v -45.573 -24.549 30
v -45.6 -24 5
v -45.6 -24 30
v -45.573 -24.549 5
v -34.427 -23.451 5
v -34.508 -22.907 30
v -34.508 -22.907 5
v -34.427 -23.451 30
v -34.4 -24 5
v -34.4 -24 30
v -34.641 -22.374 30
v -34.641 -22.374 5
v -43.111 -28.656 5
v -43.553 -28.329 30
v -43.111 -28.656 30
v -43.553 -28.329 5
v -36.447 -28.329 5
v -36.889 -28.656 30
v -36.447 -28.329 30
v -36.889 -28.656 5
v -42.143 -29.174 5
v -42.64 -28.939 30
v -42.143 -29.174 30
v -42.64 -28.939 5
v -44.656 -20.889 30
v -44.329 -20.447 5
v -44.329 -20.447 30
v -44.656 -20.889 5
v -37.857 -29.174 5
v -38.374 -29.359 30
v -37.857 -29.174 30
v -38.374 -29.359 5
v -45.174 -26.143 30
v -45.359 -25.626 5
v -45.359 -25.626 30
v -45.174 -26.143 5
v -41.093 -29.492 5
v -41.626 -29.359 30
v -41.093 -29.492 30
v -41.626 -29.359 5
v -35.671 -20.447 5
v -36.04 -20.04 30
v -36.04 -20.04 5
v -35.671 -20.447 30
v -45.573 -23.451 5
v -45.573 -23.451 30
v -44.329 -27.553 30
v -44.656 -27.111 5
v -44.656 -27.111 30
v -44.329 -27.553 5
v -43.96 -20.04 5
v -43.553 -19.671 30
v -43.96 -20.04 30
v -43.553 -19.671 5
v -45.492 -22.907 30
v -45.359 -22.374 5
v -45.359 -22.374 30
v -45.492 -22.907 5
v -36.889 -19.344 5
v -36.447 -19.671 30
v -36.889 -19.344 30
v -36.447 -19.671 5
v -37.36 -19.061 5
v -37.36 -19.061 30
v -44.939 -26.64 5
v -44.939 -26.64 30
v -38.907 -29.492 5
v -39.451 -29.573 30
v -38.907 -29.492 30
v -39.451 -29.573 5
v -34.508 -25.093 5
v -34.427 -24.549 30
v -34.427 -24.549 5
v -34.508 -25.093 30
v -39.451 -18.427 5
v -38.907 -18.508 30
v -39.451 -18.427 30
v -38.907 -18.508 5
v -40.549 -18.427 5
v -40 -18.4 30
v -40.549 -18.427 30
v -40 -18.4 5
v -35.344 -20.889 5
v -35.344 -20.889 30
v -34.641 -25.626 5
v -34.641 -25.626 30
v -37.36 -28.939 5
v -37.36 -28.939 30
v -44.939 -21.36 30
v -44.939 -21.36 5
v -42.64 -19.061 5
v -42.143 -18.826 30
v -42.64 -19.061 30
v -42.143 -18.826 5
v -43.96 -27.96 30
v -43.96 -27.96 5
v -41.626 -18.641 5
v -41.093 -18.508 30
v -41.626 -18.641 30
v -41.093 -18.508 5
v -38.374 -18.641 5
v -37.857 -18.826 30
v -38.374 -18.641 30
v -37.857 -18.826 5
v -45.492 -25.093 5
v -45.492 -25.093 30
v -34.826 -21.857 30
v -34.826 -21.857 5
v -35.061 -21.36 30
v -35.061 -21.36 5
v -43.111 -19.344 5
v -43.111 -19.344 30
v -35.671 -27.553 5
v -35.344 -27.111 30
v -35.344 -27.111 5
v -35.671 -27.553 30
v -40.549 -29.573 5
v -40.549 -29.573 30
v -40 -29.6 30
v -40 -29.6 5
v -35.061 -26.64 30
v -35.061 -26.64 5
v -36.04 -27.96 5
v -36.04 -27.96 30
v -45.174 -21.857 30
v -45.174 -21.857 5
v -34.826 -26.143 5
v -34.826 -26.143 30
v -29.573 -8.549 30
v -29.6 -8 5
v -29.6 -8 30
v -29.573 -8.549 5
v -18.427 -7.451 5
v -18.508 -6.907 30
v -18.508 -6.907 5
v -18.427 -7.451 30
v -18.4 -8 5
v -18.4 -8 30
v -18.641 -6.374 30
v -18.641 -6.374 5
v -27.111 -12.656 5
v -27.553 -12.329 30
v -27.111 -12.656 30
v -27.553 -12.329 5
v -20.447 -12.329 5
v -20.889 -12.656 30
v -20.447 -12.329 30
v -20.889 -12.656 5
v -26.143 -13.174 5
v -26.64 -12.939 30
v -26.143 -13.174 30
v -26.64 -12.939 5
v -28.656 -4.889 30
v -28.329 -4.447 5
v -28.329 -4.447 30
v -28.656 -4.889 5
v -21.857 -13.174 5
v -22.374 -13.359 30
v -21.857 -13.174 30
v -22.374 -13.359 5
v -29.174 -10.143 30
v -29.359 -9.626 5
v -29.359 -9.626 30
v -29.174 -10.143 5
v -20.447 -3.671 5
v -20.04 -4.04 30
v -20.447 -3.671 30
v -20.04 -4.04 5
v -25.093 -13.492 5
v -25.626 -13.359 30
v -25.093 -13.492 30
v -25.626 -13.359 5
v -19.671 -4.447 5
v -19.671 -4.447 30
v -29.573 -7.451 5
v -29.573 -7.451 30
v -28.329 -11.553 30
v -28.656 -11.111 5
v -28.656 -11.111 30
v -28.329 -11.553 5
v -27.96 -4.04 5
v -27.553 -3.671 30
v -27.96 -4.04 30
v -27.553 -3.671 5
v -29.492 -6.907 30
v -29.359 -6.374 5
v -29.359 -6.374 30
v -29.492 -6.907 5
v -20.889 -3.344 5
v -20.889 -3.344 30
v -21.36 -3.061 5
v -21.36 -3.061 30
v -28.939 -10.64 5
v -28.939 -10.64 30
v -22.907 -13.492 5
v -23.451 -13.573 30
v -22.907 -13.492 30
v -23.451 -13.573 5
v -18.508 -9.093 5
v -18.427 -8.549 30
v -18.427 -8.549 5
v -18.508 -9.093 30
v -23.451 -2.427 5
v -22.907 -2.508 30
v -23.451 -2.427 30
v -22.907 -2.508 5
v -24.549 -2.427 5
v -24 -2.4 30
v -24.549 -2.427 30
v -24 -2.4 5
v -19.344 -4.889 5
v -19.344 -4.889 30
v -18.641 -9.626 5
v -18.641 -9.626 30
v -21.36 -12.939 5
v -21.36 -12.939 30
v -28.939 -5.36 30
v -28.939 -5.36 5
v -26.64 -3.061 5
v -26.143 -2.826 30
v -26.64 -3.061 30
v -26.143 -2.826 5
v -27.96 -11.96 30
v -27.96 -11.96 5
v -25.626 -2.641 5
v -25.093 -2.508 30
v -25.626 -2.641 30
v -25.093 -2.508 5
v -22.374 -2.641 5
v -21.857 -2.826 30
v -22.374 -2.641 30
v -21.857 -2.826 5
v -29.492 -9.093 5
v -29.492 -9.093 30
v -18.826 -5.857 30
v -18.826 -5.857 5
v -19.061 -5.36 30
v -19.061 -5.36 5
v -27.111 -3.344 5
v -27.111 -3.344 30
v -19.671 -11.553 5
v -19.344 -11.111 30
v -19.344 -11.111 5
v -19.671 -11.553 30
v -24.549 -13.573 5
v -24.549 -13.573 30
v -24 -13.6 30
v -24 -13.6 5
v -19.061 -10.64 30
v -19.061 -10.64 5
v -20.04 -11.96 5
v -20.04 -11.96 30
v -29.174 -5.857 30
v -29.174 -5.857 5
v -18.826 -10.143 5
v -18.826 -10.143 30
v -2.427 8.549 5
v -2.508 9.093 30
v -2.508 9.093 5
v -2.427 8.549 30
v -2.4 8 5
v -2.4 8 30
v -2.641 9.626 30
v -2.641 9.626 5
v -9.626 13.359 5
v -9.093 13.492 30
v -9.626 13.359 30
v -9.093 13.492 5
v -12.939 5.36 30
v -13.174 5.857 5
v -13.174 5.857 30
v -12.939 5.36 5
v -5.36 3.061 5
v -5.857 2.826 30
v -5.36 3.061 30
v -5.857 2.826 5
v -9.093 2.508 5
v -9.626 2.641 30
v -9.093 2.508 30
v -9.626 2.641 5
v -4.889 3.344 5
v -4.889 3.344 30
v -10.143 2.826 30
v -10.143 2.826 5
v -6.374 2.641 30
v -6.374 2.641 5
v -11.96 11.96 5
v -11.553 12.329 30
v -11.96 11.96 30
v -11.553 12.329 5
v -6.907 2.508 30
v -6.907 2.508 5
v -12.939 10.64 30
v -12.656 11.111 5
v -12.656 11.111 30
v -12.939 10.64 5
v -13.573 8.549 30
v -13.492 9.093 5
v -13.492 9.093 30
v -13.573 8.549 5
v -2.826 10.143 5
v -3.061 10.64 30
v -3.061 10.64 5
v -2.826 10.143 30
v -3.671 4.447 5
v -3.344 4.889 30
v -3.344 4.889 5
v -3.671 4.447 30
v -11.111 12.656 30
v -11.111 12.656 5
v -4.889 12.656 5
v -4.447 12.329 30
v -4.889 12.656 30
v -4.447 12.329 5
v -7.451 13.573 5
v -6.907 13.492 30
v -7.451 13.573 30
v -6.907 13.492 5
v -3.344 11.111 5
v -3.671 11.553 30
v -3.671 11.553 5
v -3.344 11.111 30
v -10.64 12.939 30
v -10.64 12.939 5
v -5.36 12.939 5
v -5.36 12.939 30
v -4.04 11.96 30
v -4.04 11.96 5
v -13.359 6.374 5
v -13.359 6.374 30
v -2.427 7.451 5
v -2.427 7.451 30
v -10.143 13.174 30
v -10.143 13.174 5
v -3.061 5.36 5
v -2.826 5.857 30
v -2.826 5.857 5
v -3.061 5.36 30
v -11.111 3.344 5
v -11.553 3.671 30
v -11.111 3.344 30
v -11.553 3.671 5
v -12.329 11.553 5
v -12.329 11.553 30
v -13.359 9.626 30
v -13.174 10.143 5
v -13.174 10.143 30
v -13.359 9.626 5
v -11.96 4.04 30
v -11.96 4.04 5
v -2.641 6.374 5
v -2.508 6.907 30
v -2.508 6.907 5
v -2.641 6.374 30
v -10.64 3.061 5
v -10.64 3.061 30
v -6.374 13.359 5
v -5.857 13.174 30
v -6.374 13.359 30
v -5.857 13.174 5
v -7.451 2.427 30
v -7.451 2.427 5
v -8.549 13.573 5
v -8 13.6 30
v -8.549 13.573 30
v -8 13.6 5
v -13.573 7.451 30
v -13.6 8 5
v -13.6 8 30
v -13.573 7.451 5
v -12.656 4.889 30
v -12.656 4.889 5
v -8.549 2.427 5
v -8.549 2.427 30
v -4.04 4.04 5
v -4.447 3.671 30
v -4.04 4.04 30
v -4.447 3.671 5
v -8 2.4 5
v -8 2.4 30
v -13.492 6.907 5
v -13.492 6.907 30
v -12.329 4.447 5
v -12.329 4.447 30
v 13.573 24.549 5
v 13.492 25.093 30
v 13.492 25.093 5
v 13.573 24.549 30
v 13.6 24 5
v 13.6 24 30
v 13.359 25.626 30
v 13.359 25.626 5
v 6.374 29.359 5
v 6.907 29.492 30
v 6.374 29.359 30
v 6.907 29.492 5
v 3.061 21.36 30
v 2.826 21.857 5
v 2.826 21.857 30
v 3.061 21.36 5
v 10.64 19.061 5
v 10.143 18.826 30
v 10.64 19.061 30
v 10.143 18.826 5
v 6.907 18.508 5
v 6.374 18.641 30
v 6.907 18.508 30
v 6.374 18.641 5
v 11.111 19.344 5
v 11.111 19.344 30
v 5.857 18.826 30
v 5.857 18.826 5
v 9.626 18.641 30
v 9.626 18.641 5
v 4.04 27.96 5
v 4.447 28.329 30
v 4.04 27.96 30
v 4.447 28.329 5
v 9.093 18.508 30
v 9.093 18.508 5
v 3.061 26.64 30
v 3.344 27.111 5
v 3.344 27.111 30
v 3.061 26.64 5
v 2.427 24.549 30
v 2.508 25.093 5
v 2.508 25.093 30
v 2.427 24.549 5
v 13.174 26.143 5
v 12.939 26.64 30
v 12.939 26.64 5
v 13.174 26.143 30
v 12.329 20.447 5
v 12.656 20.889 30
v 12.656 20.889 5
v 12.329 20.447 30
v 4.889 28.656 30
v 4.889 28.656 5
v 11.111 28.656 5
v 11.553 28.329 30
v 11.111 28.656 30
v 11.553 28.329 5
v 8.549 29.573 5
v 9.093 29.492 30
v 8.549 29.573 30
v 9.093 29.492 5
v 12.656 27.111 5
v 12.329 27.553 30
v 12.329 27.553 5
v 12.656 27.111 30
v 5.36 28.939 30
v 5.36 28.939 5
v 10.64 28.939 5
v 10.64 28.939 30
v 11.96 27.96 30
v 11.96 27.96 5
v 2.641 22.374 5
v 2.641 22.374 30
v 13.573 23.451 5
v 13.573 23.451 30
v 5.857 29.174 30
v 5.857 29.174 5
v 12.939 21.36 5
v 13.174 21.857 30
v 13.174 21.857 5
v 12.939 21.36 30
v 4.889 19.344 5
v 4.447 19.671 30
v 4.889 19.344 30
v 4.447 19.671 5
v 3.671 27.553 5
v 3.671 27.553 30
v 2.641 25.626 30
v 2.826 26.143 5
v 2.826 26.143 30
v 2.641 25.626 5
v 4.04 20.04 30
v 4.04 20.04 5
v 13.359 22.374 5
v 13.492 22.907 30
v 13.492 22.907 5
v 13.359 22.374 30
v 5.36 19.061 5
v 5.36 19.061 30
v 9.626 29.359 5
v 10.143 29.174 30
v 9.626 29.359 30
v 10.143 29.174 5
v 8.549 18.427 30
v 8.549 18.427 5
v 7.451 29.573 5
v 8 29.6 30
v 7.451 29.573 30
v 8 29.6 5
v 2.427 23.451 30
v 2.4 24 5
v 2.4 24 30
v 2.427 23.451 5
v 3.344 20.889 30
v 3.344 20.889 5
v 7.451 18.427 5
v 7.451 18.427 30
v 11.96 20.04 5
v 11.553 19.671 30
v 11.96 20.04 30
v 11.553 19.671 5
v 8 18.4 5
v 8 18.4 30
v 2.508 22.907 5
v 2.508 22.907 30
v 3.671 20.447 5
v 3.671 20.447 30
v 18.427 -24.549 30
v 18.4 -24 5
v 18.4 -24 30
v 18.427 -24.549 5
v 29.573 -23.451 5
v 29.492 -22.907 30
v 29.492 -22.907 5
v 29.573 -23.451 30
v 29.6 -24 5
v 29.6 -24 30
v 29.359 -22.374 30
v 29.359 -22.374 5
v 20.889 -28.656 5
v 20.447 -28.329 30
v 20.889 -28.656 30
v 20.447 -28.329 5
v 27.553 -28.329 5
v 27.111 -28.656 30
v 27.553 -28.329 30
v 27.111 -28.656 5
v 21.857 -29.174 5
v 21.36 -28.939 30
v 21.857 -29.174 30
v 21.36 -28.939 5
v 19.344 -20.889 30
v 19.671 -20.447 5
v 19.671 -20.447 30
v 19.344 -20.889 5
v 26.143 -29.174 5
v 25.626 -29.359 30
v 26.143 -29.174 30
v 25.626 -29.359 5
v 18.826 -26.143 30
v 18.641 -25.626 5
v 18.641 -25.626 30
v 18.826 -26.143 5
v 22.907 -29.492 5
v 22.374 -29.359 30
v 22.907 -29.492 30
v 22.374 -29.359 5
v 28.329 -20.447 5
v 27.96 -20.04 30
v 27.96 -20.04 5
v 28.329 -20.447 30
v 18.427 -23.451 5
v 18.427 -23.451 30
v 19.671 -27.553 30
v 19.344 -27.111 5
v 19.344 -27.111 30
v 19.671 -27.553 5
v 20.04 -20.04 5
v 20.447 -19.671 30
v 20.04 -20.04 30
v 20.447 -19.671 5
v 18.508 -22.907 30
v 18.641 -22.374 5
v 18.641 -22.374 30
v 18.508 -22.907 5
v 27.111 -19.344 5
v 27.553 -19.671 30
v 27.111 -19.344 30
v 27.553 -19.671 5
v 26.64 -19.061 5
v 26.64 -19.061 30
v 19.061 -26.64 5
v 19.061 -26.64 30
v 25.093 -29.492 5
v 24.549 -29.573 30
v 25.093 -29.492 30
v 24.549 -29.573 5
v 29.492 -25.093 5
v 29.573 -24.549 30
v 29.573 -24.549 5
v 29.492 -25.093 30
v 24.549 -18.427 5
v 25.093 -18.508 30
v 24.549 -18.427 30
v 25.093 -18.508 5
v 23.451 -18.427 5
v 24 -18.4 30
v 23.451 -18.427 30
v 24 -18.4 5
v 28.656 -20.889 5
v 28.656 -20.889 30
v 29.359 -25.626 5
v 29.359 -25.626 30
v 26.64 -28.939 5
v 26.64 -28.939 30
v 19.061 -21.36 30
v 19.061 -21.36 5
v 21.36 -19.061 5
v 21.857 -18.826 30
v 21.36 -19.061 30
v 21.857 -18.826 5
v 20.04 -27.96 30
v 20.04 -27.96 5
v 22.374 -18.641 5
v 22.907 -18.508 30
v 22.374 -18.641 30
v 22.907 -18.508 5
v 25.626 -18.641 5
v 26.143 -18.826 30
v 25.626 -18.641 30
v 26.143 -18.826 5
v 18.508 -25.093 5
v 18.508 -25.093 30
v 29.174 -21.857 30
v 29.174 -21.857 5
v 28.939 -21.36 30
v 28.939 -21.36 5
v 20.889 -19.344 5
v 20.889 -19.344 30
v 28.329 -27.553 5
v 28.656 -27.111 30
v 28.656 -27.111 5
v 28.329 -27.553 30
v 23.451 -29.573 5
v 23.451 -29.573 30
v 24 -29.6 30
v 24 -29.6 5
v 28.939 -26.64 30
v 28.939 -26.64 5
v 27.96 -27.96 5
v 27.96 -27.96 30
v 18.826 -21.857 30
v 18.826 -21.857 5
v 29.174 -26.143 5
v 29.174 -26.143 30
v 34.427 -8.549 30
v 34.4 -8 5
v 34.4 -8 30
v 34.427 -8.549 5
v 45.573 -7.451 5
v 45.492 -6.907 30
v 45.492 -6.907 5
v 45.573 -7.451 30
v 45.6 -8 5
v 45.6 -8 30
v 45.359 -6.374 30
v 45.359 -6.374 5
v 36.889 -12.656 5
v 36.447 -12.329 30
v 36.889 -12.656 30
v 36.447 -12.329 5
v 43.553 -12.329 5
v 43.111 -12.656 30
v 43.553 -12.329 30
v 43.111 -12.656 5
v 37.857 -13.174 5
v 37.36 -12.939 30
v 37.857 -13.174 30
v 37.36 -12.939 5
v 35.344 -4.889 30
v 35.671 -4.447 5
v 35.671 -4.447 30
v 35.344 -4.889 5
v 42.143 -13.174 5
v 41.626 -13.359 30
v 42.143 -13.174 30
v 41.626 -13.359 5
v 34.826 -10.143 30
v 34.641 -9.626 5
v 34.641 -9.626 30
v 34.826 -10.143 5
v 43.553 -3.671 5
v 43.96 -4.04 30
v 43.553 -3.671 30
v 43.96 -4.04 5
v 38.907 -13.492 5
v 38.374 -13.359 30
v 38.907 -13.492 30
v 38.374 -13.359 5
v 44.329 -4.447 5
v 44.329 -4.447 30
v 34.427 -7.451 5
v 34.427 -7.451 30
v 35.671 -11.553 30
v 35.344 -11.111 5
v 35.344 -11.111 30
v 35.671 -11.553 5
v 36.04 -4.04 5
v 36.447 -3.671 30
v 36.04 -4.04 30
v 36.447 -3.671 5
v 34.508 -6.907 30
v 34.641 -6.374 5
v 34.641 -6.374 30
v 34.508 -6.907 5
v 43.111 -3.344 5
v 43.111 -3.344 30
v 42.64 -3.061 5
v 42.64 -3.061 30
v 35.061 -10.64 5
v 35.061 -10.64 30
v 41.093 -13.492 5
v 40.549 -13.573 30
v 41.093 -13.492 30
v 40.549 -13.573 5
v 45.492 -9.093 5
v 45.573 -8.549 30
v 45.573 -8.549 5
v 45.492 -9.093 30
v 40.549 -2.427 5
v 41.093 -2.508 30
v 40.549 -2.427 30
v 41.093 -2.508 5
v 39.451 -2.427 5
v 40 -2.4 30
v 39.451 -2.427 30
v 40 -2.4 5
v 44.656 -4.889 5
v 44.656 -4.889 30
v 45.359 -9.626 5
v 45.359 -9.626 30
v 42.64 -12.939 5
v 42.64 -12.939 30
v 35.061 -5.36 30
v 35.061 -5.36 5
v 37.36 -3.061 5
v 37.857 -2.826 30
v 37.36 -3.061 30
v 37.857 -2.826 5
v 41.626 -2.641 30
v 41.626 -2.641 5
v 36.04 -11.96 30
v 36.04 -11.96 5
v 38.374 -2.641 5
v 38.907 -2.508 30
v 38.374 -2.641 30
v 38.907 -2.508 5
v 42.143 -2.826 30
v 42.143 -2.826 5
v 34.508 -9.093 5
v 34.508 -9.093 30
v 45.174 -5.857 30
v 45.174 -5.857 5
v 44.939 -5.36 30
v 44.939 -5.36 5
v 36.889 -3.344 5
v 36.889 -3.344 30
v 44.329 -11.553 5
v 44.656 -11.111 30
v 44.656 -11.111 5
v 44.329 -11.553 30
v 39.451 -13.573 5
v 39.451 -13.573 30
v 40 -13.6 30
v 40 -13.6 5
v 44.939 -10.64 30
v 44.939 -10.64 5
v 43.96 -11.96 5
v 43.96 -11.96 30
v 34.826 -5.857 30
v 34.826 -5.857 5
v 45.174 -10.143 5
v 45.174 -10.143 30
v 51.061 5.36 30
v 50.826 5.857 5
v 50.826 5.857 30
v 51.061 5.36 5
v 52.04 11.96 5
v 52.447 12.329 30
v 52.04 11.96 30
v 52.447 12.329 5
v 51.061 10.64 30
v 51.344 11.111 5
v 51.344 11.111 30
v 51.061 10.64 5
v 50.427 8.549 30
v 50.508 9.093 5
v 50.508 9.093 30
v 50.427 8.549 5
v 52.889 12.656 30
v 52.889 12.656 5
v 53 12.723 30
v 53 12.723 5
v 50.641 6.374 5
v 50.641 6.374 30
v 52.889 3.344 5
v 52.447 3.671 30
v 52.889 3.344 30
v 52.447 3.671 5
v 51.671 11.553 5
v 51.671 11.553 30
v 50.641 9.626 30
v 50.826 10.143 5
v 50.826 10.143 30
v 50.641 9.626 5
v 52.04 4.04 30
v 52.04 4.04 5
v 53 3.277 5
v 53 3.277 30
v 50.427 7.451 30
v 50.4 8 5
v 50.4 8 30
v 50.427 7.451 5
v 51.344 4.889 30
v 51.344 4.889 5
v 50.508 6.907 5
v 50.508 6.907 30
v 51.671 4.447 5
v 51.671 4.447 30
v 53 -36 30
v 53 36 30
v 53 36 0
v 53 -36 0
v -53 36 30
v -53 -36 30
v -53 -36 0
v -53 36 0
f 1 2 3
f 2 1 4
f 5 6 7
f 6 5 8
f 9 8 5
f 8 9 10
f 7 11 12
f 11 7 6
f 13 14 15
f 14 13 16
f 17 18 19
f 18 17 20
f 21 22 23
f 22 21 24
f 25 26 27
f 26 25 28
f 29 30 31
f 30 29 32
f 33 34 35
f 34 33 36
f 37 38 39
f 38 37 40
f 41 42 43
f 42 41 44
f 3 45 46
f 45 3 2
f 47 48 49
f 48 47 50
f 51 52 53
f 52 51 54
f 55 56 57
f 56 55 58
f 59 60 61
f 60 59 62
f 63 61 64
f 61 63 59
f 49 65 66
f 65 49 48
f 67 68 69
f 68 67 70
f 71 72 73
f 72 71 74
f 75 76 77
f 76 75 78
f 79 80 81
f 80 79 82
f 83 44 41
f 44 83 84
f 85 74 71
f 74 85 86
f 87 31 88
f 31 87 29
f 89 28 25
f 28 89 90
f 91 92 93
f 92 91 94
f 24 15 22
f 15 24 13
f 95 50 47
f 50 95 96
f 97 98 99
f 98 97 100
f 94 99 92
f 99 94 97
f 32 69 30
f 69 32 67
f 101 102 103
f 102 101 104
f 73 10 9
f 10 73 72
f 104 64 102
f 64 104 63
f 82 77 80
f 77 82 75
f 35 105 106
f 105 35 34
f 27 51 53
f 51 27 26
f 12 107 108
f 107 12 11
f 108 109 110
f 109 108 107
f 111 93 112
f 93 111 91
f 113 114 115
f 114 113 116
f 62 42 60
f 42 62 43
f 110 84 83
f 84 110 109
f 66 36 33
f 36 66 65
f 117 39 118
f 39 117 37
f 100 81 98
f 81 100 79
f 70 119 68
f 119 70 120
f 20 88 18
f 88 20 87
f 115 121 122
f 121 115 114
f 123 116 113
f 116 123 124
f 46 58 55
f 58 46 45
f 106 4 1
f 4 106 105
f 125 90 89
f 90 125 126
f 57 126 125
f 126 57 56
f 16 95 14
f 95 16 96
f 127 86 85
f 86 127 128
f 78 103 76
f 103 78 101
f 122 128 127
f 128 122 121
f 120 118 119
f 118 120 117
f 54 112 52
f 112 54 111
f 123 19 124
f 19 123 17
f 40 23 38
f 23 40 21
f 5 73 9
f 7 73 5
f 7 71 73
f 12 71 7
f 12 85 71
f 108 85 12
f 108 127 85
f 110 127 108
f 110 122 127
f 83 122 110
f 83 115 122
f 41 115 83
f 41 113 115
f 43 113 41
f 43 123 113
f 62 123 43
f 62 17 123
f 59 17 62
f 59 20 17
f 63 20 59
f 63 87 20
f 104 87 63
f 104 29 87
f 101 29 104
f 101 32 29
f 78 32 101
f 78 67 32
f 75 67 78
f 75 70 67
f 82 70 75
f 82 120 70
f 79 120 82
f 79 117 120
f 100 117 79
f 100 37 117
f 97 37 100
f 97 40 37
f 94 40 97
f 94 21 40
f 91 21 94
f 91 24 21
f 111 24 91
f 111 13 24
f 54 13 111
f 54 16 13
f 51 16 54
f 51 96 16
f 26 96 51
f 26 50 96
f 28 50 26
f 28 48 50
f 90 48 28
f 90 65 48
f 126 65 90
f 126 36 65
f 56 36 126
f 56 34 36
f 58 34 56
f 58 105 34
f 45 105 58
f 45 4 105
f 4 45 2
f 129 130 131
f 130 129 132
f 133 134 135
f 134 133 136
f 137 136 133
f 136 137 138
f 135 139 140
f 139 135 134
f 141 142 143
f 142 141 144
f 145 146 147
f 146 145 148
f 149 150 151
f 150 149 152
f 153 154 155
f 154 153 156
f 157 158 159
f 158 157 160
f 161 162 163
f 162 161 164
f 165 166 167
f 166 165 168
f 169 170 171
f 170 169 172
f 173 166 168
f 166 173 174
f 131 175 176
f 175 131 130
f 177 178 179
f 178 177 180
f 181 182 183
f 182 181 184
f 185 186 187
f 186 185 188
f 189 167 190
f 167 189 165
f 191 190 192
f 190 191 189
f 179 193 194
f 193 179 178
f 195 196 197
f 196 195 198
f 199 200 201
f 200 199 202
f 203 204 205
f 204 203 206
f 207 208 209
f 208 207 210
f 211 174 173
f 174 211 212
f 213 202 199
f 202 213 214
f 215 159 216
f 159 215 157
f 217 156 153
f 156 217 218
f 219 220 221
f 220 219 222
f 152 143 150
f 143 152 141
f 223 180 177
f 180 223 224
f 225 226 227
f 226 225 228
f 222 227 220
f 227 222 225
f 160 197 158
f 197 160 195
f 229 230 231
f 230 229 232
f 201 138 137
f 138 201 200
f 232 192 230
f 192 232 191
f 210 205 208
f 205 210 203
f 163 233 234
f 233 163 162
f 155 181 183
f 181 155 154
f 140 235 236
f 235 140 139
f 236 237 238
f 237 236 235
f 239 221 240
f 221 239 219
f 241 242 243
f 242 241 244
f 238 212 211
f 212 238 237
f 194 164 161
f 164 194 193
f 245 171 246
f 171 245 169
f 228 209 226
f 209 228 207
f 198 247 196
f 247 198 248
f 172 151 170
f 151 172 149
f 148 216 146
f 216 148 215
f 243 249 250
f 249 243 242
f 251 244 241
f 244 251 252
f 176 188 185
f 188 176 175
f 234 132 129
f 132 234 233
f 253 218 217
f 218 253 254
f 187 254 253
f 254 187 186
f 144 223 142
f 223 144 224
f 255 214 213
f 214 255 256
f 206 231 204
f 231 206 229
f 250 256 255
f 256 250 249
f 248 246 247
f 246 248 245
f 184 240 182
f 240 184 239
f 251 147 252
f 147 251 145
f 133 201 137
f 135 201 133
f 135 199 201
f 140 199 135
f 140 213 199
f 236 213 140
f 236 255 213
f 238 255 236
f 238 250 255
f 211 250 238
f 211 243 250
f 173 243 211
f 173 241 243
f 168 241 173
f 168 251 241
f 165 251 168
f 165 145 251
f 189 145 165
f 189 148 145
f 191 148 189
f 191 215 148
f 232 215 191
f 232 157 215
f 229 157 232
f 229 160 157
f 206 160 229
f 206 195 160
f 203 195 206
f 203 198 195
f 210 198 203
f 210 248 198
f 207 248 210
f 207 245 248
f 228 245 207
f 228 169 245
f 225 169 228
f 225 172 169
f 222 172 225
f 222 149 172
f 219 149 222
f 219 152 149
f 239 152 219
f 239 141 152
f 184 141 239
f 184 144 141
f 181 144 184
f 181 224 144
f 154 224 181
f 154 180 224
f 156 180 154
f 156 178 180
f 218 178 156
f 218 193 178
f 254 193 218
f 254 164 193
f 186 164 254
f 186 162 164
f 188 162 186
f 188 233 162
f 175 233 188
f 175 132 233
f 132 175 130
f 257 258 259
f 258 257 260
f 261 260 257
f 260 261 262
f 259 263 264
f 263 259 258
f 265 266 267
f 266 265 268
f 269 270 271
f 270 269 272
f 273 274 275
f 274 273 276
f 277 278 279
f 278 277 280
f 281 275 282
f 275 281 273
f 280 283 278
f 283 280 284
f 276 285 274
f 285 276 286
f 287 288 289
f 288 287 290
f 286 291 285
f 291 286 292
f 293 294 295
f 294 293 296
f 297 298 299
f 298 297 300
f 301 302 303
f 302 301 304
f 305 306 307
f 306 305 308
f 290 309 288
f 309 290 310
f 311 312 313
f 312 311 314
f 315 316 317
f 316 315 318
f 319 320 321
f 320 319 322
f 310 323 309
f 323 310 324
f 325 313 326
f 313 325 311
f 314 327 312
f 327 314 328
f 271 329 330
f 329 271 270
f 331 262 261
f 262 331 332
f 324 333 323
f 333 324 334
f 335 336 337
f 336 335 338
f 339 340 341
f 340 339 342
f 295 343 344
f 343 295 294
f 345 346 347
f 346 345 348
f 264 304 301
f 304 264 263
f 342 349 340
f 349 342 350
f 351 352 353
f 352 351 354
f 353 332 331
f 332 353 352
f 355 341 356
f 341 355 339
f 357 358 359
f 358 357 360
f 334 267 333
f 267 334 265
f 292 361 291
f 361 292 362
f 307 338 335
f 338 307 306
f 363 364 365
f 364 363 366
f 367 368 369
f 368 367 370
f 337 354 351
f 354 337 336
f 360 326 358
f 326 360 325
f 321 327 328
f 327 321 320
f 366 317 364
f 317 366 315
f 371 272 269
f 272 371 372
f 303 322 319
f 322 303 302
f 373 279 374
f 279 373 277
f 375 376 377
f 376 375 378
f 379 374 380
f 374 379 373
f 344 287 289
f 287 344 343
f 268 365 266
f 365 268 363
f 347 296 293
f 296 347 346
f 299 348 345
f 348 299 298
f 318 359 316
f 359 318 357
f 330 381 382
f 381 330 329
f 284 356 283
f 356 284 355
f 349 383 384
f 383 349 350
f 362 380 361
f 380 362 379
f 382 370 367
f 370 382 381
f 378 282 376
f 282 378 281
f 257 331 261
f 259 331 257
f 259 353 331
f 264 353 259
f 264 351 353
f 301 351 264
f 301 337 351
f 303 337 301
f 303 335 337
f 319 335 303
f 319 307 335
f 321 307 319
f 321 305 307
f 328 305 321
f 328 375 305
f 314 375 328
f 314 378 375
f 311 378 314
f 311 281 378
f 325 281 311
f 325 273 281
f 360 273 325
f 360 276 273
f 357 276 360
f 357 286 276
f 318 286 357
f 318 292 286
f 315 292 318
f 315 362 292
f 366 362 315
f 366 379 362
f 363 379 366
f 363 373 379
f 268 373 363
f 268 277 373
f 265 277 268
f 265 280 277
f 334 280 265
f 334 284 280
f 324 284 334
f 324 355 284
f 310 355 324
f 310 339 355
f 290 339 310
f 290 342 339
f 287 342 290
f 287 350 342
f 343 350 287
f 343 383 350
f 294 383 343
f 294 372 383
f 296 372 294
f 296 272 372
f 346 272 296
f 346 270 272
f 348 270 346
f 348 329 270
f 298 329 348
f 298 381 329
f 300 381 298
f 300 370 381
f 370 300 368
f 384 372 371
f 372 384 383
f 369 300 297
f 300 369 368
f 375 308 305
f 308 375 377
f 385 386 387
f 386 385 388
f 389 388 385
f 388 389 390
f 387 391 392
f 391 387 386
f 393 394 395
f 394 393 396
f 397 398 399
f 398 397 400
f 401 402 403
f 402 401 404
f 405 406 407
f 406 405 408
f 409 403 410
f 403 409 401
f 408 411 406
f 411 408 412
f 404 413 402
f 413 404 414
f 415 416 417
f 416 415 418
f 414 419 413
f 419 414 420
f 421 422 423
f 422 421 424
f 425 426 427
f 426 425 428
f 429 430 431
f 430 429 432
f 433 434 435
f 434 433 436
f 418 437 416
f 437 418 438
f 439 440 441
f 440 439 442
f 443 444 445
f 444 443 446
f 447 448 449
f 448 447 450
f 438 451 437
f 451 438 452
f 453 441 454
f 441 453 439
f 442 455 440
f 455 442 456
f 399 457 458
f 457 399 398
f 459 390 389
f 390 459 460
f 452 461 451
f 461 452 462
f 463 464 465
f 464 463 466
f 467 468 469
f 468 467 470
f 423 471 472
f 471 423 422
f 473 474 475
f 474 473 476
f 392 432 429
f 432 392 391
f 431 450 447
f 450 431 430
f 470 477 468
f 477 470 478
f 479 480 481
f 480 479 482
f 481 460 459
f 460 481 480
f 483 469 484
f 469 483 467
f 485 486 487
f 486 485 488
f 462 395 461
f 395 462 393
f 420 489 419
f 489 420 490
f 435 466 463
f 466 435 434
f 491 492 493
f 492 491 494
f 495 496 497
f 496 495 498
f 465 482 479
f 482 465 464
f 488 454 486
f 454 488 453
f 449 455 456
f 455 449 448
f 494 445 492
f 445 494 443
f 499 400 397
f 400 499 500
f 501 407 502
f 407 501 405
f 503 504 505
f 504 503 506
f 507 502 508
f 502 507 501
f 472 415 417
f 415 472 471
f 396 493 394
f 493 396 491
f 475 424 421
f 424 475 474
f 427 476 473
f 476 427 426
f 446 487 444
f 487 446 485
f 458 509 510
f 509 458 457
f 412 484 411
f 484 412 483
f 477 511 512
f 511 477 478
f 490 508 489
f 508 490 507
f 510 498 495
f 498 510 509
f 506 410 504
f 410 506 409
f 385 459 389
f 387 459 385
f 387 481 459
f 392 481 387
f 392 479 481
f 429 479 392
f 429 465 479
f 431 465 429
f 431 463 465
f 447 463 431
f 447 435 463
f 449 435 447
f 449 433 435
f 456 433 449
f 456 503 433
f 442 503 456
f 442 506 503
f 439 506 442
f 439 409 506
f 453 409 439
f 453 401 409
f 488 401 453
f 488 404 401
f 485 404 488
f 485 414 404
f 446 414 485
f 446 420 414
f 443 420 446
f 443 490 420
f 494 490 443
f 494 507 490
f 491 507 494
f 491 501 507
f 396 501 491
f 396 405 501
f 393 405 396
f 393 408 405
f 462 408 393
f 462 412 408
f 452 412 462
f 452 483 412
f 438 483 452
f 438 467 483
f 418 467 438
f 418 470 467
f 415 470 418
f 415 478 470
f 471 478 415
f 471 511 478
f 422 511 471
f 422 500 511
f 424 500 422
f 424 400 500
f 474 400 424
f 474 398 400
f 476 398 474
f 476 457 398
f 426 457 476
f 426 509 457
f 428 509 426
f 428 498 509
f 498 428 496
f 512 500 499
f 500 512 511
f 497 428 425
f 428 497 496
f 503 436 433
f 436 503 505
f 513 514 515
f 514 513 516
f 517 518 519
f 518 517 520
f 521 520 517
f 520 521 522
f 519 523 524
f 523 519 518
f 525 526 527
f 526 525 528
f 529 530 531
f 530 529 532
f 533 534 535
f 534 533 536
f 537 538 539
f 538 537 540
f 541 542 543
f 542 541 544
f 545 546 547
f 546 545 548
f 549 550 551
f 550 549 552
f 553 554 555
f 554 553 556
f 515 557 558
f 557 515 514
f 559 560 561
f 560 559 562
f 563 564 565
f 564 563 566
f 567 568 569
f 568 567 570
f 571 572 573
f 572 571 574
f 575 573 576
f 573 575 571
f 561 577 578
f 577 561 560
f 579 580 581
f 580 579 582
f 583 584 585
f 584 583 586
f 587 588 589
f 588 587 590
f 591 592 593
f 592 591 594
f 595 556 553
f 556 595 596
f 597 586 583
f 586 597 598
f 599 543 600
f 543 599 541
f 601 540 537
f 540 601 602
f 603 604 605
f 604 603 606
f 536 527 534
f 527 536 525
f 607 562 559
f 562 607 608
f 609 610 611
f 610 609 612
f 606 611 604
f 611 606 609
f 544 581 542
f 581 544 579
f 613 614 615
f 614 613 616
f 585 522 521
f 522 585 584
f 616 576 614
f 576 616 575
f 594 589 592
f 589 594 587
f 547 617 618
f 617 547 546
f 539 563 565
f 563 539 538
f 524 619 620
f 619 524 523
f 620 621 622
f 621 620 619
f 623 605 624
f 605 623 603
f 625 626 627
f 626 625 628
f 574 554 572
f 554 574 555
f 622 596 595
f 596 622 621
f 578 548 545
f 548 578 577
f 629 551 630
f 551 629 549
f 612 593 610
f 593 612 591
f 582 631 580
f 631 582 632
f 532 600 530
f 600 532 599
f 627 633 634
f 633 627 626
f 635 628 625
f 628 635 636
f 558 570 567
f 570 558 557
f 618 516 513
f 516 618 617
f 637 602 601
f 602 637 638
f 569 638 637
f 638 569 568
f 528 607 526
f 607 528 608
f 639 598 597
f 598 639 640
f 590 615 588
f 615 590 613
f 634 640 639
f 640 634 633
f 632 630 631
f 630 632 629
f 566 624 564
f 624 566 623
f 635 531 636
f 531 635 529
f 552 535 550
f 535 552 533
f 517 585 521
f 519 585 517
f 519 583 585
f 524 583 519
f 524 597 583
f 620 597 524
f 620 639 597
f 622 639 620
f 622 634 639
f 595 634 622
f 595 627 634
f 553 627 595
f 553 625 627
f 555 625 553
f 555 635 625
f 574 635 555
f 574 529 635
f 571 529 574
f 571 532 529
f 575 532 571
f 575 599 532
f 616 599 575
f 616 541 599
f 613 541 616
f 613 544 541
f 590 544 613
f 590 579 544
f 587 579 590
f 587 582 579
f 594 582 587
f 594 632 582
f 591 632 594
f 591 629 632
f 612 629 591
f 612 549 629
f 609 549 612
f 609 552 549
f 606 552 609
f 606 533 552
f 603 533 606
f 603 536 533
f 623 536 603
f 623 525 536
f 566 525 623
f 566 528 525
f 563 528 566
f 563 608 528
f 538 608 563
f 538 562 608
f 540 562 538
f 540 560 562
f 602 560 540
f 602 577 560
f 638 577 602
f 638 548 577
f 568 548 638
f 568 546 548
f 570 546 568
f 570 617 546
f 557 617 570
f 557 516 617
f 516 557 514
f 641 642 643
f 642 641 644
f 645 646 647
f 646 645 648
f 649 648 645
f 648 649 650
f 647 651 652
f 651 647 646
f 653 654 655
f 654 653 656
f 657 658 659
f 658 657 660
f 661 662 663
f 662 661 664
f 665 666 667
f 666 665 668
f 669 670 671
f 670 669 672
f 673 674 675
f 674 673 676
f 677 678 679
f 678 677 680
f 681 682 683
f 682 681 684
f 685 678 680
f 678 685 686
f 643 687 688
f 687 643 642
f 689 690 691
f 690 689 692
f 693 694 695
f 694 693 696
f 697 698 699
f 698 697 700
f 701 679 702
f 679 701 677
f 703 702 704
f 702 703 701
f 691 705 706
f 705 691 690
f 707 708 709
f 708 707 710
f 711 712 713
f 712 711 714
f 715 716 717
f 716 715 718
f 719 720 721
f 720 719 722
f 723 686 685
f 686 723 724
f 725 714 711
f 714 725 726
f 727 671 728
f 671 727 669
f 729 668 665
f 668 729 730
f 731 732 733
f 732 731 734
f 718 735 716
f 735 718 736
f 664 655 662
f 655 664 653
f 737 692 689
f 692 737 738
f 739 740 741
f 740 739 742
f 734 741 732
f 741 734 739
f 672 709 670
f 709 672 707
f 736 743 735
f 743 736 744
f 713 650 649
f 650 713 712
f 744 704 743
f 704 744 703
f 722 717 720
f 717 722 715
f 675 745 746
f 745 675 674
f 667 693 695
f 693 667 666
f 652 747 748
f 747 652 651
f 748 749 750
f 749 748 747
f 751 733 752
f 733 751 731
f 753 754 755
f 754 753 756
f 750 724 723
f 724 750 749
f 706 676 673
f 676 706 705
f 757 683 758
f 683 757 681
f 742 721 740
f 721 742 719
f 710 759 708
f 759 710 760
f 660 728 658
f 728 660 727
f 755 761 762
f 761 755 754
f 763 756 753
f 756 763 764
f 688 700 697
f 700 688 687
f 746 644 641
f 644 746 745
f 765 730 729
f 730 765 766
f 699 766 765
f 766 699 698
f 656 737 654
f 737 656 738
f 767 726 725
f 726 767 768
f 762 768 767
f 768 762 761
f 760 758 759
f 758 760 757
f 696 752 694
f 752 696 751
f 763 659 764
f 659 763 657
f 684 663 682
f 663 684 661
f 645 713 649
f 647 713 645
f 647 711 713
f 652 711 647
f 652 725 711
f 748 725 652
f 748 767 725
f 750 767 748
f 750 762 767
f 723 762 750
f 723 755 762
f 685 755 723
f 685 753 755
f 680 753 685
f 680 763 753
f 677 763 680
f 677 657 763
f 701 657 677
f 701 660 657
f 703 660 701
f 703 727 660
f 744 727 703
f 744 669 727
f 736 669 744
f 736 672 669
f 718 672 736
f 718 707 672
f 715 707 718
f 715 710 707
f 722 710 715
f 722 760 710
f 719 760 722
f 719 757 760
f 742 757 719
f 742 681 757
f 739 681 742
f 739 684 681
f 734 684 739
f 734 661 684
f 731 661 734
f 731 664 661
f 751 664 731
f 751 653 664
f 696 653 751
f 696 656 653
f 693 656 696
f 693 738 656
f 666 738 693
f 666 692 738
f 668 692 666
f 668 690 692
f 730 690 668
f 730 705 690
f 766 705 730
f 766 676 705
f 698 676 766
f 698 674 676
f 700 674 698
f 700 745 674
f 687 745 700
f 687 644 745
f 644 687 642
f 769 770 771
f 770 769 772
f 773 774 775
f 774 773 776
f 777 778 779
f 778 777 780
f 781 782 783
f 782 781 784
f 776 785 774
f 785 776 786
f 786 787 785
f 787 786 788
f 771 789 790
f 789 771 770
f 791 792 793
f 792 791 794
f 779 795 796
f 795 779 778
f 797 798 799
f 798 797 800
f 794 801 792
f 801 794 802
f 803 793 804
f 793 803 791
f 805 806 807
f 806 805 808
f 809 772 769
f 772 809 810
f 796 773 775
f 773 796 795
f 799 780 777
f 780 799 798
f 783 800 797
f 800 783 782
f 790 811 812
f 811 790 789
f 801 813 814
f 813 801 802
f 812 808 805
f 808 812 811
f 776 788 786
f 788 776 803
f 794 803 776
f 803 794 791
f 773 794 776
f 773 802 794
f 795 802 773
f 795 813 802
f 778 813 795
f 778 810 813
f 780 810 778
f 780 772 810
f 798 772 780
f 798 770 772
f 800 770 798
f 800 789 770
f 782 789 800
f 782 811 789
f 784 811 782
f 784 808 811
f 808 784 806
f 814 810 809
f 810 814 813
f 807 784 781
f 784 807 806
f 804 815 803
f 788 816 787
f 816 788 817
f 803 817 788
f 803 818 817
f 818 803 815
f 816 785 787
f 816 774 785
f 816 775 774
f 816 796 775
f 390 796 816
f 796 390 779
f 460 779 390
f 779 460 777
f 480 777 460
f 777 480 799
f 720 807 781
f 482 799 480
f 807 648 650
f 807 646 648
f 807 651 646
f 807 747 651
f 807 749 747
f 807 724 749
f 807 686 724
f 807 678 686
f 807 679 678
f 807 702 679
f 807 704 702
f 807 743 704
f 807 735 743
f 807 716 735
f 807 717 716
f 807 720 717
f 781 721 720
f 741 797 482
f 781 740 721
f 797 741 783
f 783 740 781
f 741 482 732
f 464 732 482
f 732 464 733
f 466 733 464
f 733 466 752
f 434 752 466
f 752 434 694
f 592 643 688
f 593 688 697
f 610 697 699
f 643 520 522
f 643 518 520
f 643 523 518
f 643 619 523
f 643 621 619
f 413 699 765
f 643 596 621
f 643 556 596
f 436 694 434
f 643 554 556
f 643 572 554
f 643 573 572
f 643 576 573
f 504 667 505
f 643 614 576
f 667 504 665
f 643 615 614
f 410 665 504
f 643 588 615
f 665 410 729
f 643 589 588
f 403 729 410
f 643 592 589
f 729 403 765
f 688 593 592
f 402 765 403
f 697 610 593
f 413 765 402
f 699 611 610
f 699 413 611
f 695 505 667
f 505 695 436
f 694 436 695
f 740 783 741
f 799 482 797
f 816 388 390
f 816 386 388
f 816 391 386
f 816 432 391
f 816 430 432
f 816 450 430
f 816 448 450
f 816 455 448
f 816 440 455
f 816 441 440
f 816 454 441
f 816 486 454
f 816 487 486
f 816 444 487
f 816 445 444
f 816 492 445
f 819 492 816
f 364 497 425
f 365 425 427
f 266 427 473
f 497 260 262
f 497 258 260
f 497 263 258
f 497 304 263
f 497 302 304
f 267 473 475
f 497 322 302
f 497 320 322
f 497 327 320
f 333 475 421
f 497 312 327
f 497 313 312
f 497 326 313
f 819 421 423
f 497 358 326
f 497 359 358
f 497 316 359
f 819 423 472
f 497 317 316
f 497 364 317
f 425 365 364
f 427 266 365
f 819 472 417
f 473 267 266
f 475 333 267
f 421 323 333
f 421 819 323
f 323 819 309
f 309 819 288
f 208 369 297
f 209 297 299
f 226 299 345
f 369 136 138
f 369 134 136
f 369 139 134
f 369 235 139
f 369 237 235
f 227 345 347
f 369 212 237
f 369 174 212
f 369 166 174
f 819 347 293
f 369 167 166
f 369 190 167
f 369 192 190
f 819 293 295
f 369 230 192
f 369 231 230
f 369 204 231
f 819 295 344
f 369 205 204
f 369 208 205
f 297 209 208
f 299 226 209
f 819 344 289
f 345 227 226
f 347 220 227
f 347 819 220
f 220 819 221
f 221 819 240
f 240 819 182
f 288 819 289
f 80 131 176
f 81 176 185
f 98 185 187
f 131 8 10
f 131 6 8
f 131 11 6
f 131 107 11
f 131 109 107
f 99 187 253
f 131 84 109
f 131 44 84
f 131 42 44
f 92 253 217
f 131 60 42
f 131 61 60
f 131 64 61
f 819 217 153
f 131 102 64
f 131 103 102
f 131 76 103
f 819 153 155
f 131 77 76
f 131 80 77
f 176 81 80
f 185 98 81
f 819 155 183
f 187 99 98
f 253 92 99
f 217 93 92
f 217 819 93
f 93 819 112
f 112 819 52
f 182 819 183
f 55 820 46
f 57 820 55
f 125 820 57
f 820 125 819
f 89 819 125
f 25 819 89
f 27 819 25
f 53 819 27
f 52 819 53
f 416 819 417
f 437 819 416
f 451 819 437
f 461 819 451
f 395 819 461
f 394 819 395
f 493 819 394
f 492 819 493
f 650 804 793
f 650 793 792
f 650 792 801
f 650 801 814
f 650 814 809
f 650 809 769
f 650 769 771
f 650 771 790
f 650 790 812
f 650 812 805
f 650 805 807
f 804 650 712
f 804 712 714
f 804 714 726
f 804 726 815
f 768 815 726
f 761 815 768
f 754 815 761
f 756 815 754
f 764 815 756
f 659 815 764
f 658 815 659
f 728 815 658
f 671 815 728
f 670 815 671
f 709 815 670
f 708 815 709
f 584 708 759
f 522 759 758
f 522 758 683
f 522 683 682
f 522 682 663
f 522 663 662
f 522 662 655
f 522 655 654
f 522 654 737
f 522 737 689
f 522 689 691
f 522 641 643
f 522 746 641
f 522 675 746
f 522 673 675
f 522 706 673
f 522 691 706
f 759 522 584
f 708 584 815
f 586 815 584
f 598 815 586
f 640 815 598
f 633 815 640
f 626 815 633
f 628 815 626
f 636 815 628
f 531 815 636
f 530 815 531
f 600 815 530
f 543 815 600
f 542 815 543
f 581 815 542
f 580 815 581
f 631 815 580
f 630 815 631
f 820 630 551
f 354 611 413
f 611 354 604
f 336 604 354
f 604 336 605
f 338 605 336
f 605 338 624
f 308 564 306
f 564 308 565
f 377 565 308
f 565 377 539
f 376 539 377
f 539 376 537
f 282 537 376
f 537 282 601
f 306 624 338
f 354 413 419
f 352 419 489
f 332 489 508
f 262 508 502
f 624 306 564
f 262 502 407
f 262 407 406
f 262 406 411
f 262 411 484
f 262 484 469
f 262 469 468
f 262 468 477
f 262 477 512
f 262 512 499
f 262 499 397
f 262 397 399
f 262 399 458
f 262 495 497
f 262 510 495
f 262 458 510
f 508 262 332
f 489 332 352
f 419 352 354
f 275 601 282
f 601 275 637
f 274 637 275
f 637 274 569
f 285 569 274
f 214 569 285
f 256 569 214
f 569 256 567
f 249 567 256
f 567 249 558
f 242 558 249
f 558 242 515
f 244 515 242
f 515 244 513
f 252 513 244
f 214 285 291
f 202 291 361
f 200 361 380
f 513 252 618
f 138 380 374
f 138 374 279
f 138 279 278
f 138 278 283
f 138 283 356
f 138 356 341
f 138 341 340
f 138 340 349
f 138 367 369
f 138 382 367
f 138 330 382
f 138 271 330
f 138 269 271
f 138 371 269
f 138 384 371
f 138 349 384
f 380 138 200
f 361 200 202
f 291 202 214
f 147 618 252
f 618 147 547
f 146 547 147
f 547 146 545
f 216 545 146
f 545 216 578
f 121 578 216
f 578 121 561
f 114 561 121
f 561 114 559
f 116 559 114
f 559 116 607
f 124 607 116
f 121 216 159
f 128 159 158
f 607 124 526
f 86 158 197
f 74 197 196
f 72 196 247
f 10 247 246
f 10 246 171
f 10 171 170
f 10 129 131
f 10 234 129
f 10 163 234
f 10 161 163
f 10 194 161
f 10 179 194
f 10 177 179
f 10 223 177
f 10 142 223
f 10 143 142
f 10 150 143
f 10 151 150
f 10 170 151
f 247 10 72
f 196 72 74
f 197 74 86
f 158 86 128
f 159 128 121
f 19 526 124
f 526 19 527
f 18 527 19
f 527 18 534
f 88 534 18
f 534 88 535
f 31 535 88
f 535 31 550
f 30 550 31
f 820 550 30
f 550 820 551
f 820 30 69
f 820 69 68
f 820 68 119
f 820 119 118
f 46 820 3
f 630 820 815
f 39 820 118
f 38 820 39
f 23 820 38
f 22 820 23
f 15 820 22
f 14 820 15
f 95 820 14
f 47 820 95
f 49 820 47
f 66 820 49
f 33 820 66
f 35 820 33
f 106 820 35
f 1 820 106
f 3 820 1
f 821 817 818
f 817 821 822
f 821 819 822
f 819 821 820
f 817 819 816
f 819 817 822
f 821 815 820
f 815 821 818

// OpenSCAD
// Bench rack for 1.5 mL microcentrifuge tubes
// Print orientation: base on XY plane, holes open upward (+Z)

// ---------------- Parameters ----------------
block_len    = 106;   // block length along X (mm)
block_wid    = 72;    // block width along Y (mm)
block_h      = 30;    // block height along Z (mm)

hole_d       = 11.2;  // tube hole diameter (mm)
hole_depth   = 25;    // tube hole depth from top (mm)
hole_floor   = block_h - hole_depth; // remaining floor thickness = 5 mm

hole_count   = 24;    // total number of tube holes
hole_rows    = 4;     // number of holes along Y (rows)
hole_cols    = 6;     // number of holes along X (columns)

pitch_x      = 16;    // centre-to-centre spacing along X (mm)
pitch_y      = 16;    // centre-to-centre spacing along Y (mm)

eps          = 0.5;   // overshoot for clean boolean cuts (mm)

$fn = 64;             // circle resolution

// ---------------- Derived ----------------
first_x = -(hole_cols - 1) * pitch_x / 2;  // first hole X centre
first_y = -(hole_rows - 1) * pitch_y / 2;  // first hole Y centre

// ---------------- Model ----------------
difference() {
    // Main block, centred in X/Y, resting on z = 0
    translate([-block_len / 2, -block_wid / 2, 0])
        cube([block_len, block_wid, block_h]);

    // Tube holes: for each hole, a cylinder from top down to the floor
    for (i = [0 : hole_count - 1]) {
        translate([first_x + i * pitch_x,
                   first_y + i % hole_rows * pitch_y,
                   hole_floor])
            cylinder(d = hole_d, h = hole_depth + eps);
    }
}
